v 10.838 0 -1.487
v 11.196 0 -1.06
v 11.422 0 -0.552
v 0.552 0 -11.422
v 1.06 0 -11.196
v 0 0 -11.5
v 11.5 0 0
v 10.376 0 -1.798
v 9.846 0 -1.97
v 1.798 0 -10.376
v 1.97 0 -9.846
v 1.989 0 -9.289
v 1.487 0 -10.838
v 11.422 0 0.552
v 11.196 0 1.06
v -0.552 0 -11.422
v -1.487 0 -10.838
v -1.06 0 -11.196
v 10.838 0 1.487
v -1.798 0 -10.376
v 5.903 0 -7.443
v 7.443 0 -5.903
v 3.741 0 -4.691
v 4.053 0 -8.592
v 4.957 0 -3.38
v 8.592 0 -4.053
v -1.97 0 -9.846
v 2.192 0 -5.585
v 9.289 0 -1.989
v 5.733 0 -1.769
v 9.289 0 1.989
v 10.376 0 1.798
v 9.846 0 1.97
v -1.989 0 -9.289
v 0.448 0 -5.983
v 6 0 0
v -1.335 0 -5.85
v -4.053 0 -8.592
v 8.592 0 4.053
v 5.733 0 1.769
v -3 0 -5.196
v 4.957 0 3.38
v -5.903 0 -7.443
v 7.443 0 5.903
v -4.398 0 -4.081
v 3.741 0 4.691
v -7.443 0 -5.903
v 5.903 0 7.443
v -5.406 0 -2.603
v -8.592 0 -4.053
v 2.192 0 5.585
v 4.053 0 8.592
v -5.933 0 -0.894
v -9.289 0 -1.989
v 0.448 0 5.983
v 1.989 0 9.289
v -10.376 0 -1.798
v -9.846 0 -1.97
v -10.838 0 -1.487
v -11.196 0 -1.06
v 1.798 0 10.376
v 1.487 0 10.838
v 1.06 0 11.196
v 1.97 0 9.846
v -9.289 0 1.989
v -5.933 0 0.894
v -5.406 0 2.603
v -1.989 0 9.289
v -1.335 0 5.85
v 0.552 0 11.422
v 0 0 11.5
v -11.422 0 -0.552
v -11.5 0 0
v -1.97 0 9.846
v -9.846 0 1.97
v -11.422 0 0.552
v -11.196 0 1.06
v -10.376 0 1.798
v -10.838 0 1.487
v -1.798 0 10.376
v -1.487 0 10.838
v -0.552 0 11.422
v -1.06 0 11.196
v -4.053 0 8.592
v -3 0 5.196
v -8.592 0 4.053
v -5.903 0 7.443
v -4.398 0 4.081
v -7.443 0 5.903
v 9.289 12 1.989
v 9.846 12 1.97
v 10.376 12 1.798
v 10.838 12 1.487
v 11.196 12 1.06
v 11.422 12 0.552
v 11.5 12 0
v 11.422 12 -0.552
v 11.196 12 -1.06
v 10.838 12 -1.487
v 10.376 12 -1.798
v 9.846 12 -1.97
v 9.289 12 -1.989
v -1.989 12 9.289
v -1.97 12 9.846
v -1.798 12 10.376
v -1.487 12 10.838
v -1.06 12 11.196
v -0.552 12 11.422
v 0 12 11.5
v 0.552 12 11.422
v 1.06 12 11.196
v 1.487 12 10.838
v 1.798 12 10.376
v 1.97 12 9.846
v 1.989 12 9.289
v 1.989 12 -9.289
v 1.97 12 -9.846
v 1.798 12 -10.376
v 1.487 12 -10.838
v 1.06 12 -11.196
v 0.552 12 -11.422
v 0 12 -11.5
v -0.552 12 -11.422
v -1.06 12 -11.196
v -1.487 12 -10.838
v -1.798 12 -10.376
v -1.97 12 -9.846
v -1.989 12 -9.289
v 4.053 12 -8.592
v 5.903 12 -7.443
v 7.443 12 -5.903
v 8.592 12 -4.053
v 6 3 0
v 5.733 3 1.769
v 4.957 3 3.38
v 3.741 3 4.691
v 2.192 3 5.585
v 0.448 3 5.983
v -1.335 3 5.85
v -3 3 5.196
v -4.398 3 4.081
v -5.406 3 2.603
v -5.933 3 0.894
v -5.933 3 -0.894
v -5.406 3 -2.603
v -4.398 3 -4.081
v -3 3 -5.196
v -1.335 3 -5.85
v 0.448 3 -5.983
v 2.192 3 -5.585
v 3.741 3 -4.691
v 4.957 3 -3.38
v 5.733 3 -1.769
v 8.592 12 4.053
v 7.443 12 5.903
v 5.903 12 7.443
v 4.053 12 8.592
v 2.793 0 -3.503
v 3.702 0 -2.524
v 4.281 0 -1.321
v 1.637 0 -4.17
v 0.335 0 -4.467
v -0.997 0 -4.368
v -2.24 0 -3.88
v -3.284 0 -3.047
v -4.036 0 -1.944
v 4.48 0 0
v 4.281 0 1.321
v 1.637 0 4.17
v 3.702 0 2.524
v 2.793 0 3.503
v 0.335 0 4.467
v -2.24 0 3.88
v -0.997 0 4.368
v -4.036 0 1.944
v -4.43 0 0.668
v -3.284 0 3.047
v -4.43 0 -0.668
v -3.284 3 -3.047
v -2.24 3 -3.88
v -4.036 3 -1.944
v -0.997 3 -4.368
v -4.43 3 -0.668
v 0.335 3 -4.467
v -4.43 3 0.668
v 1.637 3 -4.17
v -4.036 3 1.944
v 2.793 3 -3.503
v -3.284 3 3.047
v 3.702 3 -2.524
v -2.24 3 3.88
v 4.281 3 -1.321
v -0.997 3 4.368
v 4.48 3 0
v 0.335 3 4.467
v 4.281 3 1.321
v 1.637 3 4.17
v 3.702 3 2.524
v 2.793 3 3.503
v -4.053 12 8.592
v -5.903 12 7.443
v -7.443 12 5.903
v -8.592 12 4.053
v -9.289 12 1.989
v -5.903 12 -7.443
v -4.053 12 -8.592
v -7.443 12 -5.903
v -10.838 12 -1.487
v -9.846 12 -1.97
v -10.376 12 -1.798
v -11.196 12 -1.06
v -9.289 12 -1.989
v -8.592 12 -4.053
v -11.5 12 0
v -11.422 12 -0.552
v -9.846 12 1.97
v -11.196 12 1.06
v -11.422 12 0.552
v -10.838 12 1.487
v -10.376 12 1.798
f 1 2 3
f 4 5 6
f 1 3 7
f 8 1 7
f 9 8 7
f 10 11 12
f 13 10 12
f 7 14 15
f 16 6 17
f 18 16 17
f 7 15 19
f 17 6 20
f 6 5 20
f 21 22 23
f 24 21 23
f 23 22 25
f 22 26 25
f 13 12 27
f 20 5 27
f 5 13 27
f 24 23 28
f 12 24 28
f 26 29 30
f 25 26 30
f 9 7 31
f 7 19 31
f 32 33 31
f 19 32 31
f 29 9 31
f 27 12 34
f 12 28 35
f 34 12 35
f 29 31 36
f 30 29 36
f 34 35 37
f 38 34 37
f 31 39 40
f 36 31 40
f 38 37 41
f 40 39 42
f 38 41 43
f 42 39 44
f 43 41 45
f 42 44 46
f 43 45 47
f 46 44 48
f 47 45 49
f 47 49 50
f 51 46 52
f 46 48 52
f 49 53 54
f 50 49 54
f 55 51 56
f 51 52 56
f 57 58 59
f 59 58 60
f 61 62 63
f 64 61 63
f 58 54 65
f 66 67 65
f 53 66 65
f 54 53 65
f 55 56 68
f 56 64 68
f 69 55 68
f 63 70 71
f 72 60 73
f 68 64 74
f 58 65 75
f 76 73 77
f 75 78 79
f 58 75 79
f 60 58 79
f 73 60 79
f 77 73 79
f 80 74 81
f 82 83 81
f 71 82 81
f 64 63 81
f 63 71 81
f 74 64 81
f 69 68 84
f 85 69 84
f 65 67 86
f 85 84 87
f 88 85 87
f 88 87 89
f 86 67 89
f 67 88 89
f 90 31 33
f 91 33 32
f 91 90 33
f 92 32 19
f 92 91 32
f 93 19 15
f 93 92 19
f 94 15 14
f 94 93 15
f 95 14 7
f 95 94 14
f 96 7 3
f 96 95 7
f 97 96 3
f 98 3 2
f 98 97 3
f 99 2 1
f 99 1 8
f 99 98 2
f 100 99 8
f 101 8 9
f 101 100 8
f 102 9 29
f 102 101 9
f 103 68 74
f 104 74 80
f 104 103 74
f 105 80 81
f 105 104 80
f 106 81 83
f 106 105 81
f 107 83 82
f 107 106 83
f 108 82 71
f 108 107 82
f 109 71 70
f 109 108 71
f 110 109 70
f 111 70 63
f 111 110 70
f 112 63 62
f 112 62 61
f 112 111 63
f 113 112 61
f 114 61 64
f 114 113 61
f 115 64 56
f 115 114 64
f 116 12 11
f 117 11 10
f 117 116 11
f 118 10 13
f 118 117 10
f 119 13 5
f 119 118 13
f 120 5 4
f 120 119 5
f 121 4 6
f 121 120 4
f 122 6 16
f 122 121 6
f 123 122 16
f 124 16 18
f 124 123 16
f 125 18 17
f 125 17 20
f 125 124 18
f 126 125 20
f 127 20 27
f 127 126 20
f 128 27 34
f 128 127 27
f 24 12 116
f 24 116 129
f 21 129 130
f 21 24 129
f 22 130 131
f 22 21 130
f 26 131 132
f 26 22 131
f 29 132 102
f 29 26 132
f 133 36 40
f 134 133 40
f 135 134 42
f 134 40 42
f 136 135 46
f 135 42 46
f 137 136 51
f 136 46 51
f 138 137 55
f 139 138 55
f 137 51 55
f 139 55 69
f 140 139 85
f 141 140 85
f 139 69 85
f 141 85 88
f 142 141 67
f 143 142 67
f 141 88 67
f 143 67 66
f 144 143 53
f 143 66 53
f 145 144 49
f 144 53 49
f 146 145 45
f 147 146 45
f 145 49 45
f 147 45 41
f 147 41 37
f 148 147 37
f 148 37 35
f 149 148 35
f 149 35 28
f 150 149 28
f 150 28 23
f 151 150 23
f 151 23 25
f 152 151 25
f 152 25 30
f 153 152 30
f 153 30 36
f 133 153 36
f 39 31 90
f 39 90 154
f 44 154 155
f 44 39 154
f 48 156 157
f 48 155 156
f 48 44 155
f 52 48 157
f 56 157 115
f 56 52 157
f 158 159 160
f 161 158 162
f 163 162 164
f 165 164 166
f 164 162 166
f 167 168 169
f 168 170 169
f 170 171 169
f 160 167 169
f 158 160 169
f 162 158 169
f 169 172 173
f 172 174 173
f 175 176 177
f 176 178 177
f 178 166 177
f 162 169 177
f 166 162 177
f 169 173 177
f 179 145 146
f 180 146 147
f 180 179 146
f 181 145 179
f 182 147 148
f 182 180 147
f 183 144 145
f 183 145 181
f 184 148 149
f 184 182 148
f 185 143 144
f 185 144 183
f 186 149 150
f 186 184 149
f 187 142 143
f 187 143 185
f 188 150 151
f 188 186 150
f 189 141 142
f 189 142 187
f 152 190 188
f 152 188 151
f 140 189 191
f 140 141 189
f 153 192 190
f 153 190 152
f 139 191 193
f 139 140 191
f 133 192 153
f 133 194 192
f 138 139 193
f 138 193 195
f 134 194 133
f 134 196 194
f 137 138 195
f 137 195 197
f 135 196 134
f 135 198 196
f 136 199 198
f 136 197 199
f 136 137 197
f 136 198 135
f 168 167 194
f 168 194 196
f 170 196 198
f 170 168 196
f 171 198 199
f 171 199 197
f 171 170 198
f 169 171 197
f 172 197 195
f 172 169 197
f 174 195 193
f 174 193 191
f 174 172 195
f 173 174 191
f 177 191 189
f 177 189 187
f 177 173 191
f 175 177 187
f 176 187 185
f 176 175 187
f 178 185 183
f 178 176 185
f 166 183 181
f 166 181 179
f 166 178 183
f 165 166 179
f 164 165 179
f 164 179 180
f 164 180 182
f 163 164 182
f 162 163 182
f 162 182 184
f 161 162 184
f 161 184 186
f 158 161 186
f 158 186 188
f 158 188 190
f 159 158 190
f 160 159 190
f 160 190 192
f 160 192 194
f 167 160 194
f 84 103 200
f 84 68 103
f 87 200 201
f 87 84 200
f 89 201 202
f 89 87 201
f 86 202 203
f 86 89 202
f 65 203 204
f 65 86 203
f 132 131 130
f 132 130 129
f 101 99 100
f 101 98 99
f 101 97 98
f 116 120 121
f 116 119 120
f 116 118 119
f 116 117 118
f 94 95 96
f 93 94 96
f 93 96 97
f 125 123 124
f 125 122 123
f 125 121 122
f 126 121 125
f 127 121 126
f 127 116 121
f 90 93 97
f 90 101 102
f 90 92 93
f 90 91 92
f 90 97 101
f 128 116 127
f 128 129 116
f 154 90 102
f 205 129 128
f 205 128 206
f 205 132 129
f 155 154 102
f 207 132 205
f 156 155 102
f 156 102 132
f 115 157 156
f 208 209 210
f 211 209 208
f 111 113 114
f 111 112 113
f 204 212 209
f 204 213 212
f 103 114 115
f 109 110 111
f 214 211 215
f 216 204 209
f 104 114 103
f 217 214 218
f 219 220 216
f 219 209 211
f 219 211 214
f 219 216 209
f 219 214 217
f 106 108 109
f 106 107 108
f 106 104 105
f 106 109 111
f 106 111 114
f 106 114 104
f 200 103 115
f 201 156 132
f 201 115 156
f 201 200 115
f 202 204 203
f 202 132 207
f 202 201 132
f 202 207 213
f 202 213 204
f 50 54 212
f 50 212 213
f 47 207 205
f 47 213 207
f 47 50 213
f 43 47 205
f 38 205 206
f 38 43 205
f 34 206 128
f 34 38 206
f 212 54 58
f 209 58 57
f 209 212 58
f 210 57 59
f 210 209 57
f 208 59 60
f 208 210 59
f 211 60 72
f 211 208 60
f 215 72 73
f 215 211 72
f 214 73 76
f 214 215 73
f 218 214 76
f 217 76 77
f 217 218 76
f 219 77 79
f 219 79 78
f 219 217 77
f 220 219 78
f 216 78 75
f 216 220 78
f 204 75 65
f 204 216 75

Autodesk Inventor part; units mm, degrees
ref_plane "YZ Plane" through (0, 0, 0) normal (1, 0, 0) x (0, 1, 0)
ref_plane "XZ Plane" through (0, 0, 0) normal (0, 1, 0) x (-1, 0, 0)
ref_plane "XY Plane" through (0, 0, 0) normal (0, 0, 1) x (1, 0, 0)
sketch "Sketch1" plane through (0, 0, 0) normal (0, 1, 0) x (-1, 0, 0)
  circle A0 centre (0, 0) radius 9.5
  dimension "d0" = 19
extrude "Extrusion1" add sketch "Sketch1" along normal blind 12
sketch "Sketch3" plane through (0, 0, 0) normal (0, -1, 0) x (1, 0, 0)
  circle A0 centre (0, 0) radius 4.48
  circle A1 centre (0, 0) radius 6
  dimension "d5" = 12
  dimension "d6" = 1.52
extrude "Extrusion3" cut sketch "Sketch3" against normal blind 3
sketch "Sketch4" plane through (0, 12, 0) normal (0, 1, 0) x (1, 0, 0)
  circle A0 centre (0, 0) radius 9.5 projected
  circle A1 centre (-9.5, 0) radius 2
  line L0 (-15.7, 0) -> (13.7, 0) projected
  point P0 (-9.2895, 1.9889)
  point P1 (-9.2895, -1.9889)
  dimension "d10" = 4
extrude "Extrusion4" add sketch "Sketch4" against normal up to surface (12 mm away) contours A0 L0 A1 | A1 L0 A0 picked at (-10.0838, 0.5297) picked at (-10.0838, -0.5297)
pattern_circular "Circular Pattern1" count 4 over 360 about axis through (0, 0, 0) along (0, 1, 0) of "Extrusion4"
properties part number "Soporte Resorte"
